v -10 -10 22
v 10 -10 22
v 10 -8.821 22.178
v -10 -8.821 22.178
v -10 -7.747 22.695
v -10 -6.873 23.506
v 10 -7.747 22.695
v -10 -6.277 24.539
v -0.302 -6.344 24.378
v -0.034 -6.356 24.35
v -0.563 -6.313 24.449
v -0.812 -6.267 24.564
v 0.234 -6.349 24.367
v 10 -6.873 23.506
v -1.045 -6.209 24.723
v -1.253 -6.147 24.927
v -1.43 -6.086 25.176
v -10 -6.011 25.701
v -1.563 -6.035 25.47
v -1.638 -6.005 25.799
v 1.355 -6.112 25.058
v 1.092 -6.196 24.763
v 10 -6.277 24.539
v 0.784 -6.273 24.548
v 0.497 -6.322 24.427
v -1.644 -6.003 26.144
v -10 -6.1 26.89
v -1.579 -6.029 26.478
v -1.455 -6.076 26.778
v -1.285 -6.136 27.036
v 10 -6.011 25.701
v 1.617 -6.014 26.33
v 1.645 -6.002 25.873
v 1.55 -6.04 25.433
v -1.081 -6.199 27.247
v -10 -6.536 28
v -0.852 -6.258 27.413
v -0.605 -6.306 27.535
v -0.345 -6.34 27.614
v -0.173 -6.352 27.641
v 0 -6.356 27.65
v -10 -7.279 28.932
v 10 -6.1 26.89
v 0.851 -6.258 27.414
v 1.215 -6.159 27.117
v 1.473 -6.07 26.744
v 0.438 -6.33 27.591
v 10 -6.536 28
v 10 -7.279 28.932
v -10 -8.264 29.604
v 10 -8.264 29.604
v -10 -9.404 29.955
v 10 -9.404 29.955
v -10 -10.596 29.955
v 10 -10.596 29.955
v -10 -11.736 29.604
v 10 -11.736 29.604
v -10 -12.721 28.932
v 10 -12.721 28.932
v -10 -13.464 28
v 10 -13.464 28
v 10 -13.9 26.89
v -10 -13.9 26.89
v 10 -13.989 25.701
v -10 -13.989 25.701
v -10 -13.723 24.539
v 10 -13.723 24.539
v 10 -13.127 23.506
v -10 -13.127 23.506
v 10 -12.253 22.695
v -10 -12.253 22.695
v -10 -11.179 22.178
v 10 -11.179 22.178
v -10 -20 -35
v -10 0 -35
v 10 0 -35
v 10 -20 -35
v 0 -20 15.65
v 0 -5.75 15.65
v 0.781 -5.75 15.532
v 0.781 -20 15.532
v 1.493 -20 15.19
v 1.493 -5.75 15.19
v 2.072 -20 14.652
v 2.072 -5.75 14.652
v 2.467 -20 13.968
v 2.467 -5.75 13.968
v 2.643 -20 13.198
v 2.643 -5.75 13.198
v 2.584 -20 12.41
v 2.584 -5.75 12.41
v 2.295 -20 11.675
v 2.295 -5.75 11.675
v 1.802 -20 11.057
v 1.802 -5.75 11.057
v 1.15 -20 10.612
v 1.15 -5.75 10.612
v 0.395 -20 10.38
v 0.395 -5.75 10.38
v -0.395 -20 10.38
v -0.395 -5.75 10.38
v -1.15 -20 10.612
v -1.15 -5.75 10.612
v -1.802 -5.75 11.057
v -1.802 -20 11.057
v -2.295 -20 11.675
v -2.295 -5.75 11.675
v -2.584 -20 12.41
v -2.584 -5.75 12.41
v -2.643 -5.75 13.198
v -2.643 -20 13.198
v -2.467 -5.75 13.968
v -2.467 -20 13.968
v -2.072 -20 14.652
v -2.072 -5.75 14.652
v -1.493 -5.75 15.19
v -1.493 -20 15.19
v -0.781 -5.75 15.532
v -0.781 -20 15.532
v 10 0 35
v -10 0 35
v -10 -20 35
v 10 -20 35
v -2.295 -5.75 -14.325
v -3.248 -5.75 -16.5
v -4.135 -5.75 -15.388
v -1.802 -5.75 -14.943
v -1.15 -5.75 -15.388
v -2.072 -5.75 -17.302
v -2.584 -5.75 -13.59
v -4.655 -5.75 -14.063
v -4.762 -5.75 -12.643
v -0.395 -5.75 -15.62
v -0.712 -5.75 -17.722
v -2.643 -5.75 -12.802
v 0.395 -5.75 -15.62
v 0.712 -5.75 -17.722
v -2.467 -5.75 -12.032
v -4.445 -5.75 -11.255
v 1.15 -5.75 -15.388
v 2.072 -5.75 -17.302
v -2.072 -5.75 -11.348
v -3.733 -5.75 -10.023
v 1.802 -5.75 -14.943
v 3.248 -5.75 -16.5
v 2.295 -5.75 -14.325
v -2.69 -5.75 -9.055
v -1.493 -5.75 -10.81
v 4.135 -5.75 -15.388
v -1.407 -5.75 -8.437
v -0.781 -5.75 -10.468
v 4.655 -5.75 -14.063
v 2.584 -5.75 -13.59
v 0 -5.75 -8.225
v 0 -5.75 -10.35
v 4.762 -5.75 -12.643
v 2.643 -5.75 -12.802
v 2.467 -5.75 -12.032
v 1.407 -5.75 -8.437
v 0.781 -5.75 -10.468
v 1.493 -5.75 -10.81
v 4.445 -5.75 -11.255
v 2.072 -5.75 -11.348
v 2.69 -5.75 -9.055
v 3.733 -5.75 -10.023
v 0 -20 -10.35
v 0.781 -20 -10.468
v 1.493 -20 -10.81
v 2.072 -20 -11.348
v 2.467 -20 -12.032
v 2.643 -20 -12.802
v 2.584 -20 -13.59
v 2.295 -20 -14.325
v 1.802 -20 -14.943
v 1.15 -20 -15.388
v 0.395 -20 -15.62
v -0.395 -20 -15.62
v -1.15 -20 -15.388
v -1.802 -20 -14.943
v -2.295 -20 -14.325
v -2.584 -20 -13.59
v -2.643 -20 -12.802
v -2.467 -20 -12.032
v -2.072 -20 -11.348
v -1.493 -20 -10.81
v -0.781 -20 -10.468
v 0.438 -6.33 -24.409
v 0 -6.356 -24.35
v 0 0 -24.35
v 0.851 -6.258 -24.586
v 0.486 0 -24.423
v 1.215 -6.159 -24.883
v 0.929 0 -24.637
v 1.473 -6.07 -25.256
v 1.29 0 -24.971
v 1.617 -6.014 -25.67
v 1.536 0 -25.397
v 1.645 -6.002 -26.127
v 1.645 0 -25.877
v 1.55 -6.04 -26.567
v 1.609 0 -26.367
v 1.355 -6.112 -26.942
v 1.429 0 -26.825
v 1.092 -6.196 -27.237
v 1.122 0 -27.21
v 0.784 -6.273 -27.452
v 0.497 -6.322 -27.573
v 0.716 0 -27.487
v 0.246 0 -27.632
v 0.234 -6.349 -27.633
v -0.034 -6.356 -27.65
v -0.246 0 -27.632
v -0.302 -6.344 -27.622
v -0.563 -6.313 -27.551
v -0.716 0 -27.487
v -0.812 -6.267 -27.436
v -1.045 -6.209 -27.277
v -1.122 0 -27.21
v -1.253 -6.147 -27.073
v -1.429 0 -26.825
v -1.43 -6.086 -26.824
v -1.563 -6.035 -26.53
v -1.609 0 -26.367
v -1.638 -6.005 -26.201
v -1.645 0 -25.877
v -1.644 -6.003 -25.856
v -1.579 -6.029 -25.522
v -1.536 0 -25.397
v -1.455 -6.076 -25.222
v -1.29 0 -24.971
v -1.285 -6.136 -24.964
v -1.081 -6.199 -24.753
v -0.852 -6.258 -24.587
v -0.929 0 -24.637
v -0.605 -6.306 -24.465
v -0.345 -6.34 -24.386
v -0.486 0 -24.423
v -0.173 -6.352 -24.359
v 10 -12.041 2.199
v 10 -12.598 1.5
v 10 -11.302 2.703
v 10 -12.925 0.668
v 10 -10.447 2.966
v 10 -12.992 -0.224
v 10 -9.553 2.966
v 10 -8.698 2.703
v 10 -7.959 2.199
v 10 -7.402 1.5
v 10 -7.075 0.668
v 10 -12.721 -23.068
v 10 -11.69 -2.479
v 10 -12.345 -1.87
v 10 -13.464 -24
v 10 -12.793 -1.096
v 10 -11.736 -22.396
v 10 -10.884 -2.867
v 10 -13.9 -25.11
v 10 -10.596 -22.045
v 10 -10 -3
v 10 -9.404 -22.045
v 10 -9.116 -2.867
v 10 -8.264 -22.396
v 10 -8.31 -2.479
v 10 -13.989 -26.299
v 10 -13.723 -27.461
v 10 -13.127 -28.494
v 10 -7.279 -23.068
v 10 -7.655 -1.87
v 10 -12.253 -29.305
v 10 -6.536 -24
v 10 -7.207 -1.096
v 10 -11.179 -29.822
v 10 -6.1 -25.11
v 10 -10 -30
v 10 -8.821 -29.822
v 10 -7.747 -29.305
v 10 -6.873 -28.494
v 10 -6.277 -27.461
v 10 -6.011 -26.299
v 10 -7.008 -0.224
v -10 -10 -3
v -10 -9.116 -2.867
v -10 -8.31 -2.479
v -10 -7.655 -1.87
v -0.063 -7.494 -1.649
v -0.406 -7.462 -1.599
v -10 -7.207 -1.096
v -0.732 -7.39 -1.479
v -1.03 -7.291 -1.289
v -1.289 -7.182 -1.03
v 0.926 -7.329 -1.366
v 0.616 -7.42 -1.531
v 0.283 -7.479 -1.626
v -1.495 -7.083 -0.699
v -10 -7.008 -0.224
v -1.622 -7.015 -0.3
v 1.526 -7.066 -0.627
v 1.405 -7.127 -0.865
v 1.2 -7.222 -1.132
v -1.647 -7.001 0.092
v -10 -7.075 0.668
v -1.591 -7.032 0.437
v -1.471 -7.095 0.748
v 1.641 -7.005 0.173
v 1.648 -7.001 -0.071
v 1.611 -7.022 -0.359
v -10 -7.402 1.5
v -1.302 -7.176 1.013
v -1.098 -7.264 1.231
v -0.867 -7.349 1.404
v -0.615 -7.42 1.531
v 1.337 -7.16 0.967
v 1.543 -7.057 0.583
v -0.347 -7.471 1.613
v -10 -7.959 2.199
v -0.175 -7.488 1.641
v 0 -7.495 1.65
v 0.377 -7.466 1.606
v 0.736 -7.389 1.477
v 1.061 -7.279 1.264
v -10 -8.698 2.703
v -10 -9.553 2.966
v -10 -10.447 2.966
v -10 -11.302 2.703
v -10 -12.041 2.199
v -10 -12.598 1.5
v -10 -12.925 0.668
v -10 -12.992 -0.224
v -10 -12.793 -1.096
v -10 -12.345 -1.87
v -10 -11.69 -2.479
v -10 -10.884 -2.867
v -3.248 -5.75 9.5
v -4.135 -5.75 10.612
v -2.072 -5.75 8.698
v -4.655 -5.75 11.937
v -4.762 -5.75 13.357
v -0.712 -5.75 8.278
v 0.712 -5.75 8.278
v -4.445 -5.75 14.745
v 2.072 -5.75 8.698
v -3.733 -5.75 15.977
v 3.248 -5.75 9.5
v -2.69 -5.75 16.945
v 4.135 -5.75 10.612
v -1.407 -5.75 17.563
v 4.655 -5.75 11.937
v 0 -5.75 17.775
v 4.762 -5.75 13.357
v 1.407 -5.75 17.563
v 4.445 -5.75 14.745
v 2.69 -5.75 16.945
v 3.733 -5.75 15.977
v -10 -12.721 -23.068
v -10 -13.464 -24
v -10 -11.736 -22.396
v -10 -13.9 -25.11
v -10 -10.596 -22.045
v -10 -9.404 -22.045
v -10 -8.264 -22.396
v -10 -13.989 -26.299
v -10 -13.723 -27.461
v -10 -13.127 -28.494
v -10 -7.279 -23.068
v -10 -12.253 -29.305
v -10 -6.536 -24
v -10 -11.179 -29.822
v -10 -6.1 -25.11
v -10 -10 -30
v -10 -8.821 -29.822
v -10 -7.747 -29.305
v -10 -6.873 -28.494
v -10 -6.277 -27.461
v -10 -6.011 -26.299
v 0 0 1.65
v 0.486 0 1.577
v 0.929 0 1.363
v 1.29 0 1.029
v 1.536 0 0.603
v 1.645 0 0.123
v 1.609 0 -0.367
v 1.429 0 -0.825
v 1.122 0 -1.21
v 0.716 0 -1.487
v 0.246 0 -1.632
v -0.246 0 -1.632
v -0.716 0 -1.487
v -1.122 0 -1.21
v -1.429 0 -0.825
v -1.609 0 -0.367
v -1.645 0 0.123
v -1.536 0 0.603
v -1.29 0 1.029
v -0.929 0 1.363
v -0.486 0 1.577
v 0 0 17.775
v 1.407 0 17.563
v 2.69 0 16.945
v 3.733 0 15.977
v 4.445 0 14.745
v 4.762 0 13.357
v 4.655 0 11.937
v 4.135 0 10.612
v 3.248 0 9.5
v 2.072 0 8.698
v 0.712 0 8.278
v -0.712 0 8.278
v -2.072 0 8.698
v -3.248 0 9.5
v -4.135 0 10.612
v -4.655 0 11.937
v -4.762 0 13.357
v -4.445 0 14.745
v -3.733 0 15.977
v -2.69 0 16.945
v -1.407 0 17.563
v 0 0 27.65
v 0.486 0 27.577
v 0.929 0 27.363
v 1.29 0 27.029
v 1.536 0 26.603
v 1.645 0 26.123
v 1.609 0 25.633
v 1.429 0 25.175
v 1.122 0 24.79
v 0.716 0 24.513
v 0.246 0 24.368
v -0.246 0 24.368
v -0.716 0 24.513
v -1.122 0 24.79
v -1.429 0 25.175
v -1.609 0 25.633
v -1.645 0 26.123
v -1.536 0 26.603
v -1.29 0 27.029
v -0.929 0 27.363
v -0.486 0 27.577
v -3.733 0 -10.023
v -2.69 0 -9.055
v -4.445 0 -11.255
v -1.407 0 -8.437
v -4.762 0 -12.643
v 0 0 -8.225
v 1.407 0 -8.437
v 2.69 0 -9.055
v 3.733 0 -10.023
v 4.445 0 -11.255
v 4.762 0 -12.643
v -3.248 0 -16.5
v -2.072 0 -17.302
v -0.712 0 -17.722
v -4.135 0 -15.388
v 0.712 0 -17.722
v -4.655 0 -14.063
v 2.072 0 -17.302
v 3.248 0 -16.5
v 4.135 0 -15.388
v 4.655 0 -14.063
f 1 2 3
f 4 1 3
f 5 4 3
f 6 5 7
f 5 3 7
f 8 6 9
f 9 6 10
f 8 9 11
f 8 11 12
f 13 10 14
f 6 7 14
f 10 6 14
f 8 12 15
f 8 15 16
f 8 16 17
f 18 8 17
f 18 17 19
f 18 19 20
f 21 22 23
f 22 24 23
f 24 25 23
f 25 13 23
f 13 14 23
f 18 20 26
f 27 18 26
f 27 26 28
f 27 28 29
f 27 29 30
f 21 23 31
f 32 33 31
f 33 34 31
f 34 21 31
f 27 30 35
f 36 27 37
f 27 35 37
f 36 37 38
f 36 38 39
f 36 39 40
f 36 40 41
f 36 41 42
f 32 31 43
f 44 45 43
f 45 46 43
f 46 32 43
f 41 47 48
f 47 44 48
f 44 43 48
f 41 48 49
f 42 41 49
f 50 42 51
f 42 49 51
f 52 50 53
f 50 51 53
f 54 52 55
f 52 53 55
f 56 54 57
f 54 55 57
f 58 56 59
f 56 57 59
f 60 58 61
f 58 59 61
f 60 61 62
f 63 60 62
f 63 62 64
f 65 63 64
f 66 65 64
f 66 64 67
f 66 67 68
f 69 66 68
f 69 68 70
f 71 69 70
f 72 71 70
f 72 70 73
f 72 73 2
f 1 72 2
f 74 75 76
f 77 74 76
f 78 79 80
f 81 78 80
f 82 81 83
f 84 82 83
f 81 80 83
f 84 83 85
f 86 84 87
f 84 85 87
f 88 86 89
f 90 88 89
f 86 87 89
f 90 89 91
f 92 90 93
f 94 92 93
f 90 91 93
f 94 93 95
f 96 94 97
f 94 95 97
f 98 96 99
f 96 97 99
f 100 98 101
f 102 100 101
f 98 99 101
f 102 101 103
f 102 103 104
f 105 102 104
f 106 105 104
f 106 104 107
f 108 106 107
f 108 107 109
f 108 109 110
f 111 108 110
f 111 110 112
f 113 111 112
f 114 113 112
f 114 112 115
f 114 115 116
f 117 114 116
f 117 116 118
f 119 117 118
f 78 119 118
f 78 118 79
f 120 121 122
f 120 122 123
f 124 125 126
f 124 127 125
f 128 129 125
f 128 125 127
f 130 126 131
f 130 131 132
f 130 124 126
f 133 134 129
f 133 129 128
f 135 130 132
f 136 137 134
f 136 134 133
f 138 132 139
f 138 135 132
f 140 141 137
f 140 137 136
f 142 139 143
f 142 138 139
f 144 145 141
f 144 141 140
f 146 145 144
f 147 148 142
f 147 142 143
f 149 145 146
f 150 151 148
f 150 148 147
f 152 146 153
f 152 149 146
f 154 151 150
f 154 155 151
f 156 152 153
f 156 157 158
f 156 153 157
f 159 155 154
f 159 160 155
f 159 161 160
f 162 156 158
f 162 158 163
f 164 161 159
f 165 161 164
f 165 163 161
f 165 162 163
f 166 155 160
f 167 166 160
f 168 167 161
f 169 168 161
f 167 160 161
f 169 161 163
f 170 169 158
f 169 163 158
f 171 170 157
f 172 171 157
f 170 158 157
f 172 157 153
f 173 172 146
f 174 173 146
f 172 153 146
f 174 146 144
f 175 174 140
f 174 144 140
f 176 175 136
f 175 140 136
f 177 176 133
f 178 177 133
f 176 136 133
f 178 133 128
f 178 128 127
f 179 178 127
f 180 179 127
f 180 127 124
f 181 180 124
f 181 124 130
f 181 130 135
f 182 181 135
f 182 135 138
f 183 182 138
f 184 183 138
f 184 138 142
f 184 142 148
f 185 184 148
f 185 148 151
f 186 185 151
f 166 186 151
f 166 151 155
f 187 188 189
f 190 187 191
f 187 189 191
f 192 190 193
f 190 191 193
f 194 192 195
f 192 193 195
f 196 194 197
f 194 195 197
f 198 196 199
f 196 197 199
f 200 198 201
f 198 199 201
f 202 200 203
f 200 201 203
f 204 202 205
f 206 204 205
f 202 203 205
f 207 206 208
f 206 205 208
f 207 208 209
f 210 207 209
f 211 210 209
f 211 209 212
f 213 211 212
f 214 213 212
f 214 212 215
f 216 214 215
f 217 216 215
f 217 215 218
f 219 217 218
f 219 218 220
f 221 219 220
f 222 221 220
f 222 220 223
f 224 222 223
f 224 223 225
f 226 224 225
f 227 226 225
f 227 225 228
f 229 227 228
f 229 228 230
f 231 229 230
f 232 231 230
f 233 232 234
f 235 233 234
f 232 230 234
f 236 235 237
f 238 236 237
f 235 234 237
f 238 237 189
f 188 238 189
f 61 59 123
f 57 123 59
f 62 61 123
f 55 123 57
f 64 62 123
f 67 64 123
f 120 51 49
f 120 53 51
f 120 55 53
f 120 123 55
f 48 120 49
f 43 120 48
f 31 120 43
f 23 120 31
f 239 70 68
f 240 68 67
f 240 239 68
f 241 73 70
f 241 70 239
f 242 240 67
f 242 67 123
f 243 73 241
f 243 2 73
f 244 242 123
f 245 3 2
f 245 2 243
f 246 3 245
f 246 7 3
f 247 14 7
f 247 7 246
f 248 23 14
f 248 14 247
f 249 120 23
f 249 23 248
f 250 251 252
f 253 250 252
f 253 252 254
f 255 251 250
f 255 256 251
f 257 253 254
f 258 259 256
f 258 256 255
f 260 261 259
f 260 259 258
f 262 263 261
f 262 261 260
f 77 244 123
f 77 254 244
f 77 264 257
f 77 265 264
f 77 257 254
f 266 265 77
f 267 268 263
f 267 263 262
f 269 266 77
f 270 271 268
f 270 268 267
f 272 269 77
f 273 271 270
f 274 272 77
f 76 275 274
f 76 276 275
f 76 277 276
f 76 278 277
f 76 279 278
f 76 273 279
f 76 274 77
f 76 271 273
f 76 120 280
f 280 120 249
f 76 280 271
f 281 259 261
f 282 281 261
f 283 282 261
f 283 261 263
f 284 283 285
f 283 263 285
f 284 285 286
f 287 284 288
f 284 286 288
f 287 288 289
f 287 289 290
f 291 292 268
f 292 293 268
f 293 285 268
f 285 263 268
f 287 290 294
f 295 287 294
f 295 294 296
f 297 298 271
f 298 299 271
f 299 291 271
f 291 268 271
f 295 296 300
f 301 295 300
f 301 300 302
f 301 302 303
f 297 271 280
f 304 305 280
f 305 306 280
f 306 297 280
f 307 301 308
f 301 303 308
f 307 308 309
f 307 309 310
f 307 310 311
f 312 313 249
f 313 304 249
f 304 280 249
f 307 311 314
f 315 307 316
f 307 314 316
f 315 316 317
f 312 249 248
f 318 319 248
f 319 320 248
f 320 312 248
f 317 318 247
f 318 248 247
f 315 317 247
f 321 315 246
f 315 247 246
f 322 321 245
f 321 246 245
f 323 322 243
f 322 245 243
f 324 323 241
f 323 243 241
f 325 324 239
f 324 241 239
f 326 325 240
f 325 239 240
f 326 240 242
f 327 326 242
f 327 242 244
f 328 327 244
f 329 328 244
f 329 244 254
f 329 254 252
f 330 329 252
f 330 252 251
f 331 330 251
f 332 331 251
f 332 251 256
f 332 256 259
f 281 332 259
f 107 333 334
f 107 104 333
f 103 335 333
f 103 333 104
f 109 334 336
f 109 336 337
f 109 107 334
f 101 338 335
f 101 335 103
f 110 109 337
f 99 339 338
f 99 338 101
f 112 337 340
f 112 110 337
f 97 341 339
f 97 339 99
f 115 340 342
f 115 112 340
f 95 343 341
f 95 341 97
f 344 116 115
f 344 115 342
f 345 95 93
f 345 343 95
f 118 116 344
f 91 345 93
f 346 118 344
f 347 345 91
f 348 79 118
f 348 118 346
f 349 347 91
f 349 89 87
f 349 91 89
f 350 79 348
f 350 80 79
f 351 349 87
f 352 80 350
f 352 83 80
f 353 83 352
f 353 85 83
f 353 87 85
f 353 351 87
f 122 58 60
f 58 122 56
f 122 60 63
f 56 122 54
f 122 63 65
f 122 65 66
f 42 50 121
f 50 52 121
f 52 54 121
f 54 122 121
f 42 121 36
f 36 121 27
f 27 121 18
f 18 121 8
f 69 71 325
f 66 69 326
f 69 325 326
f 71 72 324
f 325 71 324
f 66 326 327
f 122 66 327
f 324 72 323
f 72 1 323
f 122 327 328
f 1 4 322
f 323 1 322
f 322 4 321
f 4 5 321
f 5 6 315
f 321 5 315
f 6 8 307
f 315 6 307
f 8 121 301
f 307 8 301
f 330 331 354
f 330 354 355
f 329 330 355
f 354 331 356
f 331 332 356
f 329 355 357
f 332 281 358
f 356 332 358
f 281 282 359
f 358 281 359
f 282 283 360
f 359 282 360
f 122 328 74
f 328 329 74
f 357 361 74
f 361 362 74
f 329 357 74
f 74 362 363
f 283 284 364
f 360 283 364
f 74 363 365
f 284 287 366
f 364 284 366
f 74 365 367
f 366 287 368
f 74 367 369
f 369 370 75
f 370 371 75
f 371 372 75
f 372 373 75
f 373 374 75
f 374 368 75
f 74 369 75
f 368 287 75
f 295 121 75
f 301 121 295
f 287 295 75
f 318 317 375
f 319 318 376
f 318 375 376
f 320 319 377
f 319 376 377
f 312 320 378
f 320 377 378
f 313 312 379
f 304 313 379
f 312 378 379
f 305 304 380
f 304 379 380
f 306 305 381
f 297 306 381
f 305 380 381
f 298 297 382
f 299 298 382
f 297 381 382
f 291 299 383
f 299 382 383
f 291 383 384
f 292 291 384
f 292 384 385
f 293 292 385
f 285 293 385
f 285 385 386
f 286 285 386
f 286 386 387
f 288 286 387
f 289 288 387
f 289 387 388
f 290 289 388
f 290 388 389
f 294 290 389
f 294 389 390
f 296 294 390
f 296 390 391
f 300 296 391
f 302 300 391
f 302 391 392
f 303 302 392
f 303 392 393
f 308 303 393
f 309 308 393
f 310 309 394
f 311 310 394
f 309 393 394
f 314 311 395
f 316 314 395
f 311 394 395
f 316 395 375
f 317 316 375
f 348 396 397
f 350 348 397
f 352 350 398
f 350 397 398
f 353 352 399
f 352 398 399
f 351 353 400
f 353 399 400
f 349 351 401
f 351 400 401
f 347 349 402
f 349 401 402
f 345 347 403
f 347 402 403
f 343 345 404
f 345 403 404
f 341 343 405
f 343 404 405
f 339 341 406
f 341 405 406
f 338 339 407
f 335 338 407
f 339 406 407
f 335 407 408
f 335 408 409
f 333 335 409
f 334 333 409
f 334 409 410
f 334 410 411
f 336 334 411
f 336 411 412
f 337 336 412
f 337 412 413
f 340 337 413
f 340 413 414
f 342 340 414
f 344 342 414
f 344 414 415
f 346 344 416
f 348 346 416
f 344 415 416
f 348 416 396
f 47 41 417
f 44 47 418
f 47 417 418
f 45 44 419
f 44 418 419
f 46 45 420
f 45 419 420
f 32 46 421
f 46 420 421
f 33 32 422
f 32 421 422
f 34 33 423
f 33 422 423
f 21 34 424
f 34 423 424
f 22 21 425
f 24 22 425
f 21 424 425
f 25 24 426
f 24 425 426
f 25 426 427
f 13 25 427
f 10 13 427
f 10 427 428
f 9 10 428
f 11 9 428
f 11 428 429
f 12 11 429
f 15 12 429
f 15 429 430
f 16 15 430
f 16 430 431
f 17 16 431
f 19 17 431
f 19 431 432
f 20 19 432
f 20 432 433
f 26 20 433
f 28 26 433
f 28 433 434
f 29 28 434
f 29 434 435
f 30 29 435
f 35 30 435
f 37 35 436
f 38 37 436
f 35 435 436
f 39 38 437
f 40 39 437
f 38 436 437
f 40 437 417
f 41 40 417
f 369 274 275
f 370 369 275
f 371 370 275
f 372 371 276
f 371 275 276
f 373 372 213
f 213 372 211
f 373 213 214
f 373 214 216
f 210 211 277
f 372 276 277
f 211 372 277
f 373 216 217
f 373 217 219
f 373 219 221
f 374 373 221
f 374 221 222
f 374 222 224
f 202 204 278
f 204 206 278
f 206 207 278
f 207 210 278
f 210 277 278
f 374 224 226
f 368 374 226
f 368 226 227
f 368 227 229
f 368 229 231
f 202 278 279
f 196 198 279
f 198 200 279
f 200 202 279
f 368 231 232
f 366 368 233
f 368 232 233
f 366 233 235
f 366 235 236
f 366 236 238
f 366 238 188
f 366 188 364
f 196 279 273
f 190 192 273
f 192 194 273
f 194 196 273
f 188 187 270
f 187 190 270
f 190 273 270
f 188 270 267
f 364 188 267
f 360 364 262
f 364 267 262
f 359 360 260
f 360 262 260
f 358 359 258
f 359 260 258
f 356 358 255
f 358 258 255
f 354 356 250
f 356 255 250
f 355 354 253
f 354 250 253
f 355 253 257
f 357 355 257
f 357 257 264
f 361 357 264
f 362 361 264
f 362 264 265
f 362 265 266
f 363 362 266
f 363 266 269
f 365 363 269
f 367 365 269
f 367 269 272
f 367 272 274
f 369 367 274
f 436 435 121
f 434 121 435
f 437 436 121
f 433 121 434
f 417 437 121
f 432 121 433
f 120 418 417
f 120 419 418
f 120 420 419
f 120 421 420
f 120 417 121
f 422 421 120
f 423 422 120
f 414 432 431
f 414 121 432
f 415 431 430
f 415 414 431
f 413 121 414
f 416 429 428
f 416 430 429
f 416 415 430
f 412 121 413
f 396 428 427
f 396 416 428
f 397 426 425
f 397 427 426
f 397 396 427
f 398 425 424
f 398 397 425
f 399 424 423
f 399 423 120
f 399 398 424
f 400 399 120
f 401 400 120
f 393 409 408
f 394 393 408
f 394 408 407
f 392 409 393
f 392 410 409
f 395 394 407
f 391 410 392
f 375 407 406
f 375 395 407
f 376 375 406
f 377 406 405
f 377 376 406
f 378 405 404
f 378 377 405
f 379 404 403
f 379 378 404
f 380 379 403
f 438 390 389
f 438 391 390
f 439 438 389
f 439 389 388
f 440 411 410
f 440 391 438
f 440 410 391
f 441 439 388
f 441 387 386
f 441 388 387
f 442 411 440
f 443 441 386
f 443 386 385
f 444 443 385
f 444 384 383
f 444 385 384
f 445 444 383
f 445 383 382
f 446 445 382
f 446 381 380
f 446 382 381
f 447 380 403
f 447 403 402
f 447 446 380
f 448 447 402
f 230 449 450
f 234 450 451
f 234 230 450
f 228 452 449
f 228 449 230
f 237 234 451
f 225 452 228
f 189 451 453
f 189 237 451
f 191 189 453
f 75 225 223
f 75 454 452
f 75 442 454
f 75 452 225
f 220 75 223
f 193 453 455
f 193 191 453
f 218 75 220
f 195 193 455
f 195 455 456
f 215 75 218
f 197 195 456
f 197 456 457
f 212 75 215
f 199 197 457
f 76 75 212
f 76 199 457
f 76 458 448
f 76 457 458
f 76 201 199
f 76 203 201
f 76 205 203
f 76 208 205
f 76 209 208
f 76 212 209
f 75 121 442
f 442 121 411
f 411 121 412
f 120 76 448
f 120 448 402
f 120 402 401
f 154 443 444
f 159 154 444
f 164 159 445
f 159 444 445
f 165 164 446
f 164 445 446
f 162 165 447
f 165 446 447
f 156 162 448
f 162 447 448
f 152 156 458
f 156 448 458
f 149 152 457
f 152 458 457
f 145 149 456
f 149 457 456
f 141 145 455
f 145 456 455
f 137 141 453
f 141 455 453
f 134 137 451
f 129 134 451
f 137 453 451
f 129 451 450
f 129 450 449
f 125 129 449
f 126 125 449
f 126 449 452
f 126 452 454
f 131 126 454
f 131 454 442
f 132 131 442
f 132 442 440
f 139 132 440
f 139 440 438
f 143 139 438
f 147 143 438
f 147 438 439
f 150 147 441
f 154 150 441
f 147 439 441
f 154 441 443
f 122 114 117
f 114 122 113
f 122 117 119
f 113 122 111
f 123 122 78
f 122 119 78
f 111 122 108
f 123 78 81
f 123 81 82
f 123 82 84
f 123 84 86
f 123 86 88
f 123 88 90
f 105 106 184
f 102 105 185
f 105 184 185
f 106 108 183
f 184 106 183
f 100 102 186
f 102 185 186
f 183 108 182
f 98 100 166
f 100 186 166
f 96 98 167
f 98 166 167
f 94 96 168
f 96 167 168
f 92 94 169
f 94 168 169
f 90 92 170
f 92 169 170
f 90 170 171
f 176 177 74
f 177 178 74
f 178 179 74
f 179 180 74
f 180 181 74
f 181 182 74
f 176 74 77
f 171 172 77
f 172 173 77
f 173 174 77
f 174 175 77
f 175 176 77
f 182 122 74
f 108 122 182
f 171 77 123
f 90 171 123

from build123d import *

# Parameters (mm, degrees)
ESBO_O1_W             = 20
ESBO_O1_H             = 70
FLANGE_BASE1_DEPTH    = 20
ESBO_O3_R             = 4.775
CORTE_EXTRUS_O1_DEPTH = 5.75
ESBO_O4_R             = 2.65
CORTE_EXTRUS_O2_DEPTH = 40.090440008
ESBO_O5_R             = 4
ESBO_O5_R_2           = 3
CORTE_EXTRUS_O3_DEPTH = 46
CORTE_EXTRUS_O5_REACH = 43.533
ESBO_O6_R             = 1.65


# Sheet-metal steps are written as plain solids
with BuildPart() as part:
    # Esboço1 → Flange-base1 (new body)
    with BuildSketch(Plane(origin=(0, 0, 0), x_dir=(1, 0, 0), z_dir=(0, 1, 0))):
        Rectangle(ESBO_O1_W, ESBO_O1_H)
    extrude(amount=-FLANGE_BASE1_DEPTH)

    # Esboço3 → Corte-extrusão1 (cut)
    with BuildSketch(Plane(origin=(0, 0, 0), x_dir=(1, 0, 0), z_dir=(0, 1, 0))):
        with Locations(Location((0, 13, 0), (0, 0, 270))):
            Circle(ESBO_O3_R)
        with Locations(Location((0, -13, 0), (0, 0, 270))):
            Circle(ESBO_O3_R)
    extrude(amount=-CORTE_EXTRUS_O1_DEPTH, mode=Mode.SUBTRACT)

    # Esboço4 → Corte-extrusão2 (cut, through all)
    with BuildSketch(Plane(origin=(0, -5.75, 0), x_dir=(1, 0, 0), z_dir=(0, 1, 0))):
        with Locations(Location((0, 13, 0), (0, 0, 270))):
            Circle(ESBO_O4_R)
        with Locations(Location((0, -13, 0), (0, 0, 270))):
            Circle(ESBO_O4_R)
    extrude(amount=-CORTE_EXTRUS_O2_DEPTH, mode=Mode.SUBTRACT)

    # Esboço5 → Corte-extrusão3 (cut, through all)
    with BuildSketch(Plane(origin=(10, 0, 0), x_dir=(0, 0, -1), z_dir=(1, 0, 0))):
        with Locations((-26, -10)):
            Circle(ESBO_O5_R)
        with Locations((26, -10)):
            Circle(ESBO_O5_R)
        with Locations((0, -10)):
            Circle(ESBO_O5_R_2)
    extrude(amount=-CORTE_EXTRUS_O3_DEPTH, mode=Mode.SUBTRACT)

    # Esboço6 → Corte-extrusão5 (cut, up to next)
    with BuildSketch(Plane(origin=(0, 0, 0), x_dir=(1, 0, 0), z_dir=(0, 1, 0)), mode=Mode.PRIVATE) as corte_extrus_o5_sk1:
        with Locations(Location((0, -26, 0), (0, 0, 270))):
            Circle(ESBO_O6_R)
    corte_extrus_o5_tool1 = extrude(corte_extrus_o5_sk1.sketch, amount=-CORTE_EXTRUS_O5_REACH, mode=Mode.PRIVATE) & part.part
    # Esboço6 → Corte-extrusão5 (cut, up to next)
    with BuildSketch(Plane(origin=(0, 0, 0), x_dir=(1, 0, 0), z_dir=(0, 1, 0)), mode=Mode.PRIVATE) as corte_extrus_o5_sk2:
        with Locations(Location((0, 26, 0), (0, 0, 270))):
            Circle(ESBO_O6_R)
    corte_extrus_o5_tool2 = extrude(corte_extrus_o5_sk2.sketch, amount=-CORTE_EXTRUS_O5_REACH, mode=Mode.PRIVATE) & part.part
    # Esboço6 → Corte-extrusão5 (cut, up to next)
    with BuildSketch(Plane(origin=(0, 0, 0), x_dir=(1, 0, 0), z_dir=(0, 1, 0)), mode=Mode.PRIVATE) as corte_extrus_o5_sk3:
        with Locations(Location((0, 0, 0), (0, 0, 270))):
            Circle(ESBO_O6_R)
    corte_extrus_o5_tool3 = extrude(corte_extrus_o5_sk3.sketch, amount=-CORTE_EXTRUS_O5_REACH, mode=Mode.PRIVATE) & part.part
    add(corte_extrus_o5_tool1.solids().sort_by_distance((0, 0, 26))[0], mode=Mode.SUBTRACT)
    add(corte_extrus_o5_tool2.solids().sort_by_distance((0, 0, -26))[0], mode=Mode.SUBTRACT)
    add(corte_extrus_o5_tool3.solids().sort_by_distance((0, 0, 0))[0], mode=Mode.SUBTRACT)


solid = part.part
